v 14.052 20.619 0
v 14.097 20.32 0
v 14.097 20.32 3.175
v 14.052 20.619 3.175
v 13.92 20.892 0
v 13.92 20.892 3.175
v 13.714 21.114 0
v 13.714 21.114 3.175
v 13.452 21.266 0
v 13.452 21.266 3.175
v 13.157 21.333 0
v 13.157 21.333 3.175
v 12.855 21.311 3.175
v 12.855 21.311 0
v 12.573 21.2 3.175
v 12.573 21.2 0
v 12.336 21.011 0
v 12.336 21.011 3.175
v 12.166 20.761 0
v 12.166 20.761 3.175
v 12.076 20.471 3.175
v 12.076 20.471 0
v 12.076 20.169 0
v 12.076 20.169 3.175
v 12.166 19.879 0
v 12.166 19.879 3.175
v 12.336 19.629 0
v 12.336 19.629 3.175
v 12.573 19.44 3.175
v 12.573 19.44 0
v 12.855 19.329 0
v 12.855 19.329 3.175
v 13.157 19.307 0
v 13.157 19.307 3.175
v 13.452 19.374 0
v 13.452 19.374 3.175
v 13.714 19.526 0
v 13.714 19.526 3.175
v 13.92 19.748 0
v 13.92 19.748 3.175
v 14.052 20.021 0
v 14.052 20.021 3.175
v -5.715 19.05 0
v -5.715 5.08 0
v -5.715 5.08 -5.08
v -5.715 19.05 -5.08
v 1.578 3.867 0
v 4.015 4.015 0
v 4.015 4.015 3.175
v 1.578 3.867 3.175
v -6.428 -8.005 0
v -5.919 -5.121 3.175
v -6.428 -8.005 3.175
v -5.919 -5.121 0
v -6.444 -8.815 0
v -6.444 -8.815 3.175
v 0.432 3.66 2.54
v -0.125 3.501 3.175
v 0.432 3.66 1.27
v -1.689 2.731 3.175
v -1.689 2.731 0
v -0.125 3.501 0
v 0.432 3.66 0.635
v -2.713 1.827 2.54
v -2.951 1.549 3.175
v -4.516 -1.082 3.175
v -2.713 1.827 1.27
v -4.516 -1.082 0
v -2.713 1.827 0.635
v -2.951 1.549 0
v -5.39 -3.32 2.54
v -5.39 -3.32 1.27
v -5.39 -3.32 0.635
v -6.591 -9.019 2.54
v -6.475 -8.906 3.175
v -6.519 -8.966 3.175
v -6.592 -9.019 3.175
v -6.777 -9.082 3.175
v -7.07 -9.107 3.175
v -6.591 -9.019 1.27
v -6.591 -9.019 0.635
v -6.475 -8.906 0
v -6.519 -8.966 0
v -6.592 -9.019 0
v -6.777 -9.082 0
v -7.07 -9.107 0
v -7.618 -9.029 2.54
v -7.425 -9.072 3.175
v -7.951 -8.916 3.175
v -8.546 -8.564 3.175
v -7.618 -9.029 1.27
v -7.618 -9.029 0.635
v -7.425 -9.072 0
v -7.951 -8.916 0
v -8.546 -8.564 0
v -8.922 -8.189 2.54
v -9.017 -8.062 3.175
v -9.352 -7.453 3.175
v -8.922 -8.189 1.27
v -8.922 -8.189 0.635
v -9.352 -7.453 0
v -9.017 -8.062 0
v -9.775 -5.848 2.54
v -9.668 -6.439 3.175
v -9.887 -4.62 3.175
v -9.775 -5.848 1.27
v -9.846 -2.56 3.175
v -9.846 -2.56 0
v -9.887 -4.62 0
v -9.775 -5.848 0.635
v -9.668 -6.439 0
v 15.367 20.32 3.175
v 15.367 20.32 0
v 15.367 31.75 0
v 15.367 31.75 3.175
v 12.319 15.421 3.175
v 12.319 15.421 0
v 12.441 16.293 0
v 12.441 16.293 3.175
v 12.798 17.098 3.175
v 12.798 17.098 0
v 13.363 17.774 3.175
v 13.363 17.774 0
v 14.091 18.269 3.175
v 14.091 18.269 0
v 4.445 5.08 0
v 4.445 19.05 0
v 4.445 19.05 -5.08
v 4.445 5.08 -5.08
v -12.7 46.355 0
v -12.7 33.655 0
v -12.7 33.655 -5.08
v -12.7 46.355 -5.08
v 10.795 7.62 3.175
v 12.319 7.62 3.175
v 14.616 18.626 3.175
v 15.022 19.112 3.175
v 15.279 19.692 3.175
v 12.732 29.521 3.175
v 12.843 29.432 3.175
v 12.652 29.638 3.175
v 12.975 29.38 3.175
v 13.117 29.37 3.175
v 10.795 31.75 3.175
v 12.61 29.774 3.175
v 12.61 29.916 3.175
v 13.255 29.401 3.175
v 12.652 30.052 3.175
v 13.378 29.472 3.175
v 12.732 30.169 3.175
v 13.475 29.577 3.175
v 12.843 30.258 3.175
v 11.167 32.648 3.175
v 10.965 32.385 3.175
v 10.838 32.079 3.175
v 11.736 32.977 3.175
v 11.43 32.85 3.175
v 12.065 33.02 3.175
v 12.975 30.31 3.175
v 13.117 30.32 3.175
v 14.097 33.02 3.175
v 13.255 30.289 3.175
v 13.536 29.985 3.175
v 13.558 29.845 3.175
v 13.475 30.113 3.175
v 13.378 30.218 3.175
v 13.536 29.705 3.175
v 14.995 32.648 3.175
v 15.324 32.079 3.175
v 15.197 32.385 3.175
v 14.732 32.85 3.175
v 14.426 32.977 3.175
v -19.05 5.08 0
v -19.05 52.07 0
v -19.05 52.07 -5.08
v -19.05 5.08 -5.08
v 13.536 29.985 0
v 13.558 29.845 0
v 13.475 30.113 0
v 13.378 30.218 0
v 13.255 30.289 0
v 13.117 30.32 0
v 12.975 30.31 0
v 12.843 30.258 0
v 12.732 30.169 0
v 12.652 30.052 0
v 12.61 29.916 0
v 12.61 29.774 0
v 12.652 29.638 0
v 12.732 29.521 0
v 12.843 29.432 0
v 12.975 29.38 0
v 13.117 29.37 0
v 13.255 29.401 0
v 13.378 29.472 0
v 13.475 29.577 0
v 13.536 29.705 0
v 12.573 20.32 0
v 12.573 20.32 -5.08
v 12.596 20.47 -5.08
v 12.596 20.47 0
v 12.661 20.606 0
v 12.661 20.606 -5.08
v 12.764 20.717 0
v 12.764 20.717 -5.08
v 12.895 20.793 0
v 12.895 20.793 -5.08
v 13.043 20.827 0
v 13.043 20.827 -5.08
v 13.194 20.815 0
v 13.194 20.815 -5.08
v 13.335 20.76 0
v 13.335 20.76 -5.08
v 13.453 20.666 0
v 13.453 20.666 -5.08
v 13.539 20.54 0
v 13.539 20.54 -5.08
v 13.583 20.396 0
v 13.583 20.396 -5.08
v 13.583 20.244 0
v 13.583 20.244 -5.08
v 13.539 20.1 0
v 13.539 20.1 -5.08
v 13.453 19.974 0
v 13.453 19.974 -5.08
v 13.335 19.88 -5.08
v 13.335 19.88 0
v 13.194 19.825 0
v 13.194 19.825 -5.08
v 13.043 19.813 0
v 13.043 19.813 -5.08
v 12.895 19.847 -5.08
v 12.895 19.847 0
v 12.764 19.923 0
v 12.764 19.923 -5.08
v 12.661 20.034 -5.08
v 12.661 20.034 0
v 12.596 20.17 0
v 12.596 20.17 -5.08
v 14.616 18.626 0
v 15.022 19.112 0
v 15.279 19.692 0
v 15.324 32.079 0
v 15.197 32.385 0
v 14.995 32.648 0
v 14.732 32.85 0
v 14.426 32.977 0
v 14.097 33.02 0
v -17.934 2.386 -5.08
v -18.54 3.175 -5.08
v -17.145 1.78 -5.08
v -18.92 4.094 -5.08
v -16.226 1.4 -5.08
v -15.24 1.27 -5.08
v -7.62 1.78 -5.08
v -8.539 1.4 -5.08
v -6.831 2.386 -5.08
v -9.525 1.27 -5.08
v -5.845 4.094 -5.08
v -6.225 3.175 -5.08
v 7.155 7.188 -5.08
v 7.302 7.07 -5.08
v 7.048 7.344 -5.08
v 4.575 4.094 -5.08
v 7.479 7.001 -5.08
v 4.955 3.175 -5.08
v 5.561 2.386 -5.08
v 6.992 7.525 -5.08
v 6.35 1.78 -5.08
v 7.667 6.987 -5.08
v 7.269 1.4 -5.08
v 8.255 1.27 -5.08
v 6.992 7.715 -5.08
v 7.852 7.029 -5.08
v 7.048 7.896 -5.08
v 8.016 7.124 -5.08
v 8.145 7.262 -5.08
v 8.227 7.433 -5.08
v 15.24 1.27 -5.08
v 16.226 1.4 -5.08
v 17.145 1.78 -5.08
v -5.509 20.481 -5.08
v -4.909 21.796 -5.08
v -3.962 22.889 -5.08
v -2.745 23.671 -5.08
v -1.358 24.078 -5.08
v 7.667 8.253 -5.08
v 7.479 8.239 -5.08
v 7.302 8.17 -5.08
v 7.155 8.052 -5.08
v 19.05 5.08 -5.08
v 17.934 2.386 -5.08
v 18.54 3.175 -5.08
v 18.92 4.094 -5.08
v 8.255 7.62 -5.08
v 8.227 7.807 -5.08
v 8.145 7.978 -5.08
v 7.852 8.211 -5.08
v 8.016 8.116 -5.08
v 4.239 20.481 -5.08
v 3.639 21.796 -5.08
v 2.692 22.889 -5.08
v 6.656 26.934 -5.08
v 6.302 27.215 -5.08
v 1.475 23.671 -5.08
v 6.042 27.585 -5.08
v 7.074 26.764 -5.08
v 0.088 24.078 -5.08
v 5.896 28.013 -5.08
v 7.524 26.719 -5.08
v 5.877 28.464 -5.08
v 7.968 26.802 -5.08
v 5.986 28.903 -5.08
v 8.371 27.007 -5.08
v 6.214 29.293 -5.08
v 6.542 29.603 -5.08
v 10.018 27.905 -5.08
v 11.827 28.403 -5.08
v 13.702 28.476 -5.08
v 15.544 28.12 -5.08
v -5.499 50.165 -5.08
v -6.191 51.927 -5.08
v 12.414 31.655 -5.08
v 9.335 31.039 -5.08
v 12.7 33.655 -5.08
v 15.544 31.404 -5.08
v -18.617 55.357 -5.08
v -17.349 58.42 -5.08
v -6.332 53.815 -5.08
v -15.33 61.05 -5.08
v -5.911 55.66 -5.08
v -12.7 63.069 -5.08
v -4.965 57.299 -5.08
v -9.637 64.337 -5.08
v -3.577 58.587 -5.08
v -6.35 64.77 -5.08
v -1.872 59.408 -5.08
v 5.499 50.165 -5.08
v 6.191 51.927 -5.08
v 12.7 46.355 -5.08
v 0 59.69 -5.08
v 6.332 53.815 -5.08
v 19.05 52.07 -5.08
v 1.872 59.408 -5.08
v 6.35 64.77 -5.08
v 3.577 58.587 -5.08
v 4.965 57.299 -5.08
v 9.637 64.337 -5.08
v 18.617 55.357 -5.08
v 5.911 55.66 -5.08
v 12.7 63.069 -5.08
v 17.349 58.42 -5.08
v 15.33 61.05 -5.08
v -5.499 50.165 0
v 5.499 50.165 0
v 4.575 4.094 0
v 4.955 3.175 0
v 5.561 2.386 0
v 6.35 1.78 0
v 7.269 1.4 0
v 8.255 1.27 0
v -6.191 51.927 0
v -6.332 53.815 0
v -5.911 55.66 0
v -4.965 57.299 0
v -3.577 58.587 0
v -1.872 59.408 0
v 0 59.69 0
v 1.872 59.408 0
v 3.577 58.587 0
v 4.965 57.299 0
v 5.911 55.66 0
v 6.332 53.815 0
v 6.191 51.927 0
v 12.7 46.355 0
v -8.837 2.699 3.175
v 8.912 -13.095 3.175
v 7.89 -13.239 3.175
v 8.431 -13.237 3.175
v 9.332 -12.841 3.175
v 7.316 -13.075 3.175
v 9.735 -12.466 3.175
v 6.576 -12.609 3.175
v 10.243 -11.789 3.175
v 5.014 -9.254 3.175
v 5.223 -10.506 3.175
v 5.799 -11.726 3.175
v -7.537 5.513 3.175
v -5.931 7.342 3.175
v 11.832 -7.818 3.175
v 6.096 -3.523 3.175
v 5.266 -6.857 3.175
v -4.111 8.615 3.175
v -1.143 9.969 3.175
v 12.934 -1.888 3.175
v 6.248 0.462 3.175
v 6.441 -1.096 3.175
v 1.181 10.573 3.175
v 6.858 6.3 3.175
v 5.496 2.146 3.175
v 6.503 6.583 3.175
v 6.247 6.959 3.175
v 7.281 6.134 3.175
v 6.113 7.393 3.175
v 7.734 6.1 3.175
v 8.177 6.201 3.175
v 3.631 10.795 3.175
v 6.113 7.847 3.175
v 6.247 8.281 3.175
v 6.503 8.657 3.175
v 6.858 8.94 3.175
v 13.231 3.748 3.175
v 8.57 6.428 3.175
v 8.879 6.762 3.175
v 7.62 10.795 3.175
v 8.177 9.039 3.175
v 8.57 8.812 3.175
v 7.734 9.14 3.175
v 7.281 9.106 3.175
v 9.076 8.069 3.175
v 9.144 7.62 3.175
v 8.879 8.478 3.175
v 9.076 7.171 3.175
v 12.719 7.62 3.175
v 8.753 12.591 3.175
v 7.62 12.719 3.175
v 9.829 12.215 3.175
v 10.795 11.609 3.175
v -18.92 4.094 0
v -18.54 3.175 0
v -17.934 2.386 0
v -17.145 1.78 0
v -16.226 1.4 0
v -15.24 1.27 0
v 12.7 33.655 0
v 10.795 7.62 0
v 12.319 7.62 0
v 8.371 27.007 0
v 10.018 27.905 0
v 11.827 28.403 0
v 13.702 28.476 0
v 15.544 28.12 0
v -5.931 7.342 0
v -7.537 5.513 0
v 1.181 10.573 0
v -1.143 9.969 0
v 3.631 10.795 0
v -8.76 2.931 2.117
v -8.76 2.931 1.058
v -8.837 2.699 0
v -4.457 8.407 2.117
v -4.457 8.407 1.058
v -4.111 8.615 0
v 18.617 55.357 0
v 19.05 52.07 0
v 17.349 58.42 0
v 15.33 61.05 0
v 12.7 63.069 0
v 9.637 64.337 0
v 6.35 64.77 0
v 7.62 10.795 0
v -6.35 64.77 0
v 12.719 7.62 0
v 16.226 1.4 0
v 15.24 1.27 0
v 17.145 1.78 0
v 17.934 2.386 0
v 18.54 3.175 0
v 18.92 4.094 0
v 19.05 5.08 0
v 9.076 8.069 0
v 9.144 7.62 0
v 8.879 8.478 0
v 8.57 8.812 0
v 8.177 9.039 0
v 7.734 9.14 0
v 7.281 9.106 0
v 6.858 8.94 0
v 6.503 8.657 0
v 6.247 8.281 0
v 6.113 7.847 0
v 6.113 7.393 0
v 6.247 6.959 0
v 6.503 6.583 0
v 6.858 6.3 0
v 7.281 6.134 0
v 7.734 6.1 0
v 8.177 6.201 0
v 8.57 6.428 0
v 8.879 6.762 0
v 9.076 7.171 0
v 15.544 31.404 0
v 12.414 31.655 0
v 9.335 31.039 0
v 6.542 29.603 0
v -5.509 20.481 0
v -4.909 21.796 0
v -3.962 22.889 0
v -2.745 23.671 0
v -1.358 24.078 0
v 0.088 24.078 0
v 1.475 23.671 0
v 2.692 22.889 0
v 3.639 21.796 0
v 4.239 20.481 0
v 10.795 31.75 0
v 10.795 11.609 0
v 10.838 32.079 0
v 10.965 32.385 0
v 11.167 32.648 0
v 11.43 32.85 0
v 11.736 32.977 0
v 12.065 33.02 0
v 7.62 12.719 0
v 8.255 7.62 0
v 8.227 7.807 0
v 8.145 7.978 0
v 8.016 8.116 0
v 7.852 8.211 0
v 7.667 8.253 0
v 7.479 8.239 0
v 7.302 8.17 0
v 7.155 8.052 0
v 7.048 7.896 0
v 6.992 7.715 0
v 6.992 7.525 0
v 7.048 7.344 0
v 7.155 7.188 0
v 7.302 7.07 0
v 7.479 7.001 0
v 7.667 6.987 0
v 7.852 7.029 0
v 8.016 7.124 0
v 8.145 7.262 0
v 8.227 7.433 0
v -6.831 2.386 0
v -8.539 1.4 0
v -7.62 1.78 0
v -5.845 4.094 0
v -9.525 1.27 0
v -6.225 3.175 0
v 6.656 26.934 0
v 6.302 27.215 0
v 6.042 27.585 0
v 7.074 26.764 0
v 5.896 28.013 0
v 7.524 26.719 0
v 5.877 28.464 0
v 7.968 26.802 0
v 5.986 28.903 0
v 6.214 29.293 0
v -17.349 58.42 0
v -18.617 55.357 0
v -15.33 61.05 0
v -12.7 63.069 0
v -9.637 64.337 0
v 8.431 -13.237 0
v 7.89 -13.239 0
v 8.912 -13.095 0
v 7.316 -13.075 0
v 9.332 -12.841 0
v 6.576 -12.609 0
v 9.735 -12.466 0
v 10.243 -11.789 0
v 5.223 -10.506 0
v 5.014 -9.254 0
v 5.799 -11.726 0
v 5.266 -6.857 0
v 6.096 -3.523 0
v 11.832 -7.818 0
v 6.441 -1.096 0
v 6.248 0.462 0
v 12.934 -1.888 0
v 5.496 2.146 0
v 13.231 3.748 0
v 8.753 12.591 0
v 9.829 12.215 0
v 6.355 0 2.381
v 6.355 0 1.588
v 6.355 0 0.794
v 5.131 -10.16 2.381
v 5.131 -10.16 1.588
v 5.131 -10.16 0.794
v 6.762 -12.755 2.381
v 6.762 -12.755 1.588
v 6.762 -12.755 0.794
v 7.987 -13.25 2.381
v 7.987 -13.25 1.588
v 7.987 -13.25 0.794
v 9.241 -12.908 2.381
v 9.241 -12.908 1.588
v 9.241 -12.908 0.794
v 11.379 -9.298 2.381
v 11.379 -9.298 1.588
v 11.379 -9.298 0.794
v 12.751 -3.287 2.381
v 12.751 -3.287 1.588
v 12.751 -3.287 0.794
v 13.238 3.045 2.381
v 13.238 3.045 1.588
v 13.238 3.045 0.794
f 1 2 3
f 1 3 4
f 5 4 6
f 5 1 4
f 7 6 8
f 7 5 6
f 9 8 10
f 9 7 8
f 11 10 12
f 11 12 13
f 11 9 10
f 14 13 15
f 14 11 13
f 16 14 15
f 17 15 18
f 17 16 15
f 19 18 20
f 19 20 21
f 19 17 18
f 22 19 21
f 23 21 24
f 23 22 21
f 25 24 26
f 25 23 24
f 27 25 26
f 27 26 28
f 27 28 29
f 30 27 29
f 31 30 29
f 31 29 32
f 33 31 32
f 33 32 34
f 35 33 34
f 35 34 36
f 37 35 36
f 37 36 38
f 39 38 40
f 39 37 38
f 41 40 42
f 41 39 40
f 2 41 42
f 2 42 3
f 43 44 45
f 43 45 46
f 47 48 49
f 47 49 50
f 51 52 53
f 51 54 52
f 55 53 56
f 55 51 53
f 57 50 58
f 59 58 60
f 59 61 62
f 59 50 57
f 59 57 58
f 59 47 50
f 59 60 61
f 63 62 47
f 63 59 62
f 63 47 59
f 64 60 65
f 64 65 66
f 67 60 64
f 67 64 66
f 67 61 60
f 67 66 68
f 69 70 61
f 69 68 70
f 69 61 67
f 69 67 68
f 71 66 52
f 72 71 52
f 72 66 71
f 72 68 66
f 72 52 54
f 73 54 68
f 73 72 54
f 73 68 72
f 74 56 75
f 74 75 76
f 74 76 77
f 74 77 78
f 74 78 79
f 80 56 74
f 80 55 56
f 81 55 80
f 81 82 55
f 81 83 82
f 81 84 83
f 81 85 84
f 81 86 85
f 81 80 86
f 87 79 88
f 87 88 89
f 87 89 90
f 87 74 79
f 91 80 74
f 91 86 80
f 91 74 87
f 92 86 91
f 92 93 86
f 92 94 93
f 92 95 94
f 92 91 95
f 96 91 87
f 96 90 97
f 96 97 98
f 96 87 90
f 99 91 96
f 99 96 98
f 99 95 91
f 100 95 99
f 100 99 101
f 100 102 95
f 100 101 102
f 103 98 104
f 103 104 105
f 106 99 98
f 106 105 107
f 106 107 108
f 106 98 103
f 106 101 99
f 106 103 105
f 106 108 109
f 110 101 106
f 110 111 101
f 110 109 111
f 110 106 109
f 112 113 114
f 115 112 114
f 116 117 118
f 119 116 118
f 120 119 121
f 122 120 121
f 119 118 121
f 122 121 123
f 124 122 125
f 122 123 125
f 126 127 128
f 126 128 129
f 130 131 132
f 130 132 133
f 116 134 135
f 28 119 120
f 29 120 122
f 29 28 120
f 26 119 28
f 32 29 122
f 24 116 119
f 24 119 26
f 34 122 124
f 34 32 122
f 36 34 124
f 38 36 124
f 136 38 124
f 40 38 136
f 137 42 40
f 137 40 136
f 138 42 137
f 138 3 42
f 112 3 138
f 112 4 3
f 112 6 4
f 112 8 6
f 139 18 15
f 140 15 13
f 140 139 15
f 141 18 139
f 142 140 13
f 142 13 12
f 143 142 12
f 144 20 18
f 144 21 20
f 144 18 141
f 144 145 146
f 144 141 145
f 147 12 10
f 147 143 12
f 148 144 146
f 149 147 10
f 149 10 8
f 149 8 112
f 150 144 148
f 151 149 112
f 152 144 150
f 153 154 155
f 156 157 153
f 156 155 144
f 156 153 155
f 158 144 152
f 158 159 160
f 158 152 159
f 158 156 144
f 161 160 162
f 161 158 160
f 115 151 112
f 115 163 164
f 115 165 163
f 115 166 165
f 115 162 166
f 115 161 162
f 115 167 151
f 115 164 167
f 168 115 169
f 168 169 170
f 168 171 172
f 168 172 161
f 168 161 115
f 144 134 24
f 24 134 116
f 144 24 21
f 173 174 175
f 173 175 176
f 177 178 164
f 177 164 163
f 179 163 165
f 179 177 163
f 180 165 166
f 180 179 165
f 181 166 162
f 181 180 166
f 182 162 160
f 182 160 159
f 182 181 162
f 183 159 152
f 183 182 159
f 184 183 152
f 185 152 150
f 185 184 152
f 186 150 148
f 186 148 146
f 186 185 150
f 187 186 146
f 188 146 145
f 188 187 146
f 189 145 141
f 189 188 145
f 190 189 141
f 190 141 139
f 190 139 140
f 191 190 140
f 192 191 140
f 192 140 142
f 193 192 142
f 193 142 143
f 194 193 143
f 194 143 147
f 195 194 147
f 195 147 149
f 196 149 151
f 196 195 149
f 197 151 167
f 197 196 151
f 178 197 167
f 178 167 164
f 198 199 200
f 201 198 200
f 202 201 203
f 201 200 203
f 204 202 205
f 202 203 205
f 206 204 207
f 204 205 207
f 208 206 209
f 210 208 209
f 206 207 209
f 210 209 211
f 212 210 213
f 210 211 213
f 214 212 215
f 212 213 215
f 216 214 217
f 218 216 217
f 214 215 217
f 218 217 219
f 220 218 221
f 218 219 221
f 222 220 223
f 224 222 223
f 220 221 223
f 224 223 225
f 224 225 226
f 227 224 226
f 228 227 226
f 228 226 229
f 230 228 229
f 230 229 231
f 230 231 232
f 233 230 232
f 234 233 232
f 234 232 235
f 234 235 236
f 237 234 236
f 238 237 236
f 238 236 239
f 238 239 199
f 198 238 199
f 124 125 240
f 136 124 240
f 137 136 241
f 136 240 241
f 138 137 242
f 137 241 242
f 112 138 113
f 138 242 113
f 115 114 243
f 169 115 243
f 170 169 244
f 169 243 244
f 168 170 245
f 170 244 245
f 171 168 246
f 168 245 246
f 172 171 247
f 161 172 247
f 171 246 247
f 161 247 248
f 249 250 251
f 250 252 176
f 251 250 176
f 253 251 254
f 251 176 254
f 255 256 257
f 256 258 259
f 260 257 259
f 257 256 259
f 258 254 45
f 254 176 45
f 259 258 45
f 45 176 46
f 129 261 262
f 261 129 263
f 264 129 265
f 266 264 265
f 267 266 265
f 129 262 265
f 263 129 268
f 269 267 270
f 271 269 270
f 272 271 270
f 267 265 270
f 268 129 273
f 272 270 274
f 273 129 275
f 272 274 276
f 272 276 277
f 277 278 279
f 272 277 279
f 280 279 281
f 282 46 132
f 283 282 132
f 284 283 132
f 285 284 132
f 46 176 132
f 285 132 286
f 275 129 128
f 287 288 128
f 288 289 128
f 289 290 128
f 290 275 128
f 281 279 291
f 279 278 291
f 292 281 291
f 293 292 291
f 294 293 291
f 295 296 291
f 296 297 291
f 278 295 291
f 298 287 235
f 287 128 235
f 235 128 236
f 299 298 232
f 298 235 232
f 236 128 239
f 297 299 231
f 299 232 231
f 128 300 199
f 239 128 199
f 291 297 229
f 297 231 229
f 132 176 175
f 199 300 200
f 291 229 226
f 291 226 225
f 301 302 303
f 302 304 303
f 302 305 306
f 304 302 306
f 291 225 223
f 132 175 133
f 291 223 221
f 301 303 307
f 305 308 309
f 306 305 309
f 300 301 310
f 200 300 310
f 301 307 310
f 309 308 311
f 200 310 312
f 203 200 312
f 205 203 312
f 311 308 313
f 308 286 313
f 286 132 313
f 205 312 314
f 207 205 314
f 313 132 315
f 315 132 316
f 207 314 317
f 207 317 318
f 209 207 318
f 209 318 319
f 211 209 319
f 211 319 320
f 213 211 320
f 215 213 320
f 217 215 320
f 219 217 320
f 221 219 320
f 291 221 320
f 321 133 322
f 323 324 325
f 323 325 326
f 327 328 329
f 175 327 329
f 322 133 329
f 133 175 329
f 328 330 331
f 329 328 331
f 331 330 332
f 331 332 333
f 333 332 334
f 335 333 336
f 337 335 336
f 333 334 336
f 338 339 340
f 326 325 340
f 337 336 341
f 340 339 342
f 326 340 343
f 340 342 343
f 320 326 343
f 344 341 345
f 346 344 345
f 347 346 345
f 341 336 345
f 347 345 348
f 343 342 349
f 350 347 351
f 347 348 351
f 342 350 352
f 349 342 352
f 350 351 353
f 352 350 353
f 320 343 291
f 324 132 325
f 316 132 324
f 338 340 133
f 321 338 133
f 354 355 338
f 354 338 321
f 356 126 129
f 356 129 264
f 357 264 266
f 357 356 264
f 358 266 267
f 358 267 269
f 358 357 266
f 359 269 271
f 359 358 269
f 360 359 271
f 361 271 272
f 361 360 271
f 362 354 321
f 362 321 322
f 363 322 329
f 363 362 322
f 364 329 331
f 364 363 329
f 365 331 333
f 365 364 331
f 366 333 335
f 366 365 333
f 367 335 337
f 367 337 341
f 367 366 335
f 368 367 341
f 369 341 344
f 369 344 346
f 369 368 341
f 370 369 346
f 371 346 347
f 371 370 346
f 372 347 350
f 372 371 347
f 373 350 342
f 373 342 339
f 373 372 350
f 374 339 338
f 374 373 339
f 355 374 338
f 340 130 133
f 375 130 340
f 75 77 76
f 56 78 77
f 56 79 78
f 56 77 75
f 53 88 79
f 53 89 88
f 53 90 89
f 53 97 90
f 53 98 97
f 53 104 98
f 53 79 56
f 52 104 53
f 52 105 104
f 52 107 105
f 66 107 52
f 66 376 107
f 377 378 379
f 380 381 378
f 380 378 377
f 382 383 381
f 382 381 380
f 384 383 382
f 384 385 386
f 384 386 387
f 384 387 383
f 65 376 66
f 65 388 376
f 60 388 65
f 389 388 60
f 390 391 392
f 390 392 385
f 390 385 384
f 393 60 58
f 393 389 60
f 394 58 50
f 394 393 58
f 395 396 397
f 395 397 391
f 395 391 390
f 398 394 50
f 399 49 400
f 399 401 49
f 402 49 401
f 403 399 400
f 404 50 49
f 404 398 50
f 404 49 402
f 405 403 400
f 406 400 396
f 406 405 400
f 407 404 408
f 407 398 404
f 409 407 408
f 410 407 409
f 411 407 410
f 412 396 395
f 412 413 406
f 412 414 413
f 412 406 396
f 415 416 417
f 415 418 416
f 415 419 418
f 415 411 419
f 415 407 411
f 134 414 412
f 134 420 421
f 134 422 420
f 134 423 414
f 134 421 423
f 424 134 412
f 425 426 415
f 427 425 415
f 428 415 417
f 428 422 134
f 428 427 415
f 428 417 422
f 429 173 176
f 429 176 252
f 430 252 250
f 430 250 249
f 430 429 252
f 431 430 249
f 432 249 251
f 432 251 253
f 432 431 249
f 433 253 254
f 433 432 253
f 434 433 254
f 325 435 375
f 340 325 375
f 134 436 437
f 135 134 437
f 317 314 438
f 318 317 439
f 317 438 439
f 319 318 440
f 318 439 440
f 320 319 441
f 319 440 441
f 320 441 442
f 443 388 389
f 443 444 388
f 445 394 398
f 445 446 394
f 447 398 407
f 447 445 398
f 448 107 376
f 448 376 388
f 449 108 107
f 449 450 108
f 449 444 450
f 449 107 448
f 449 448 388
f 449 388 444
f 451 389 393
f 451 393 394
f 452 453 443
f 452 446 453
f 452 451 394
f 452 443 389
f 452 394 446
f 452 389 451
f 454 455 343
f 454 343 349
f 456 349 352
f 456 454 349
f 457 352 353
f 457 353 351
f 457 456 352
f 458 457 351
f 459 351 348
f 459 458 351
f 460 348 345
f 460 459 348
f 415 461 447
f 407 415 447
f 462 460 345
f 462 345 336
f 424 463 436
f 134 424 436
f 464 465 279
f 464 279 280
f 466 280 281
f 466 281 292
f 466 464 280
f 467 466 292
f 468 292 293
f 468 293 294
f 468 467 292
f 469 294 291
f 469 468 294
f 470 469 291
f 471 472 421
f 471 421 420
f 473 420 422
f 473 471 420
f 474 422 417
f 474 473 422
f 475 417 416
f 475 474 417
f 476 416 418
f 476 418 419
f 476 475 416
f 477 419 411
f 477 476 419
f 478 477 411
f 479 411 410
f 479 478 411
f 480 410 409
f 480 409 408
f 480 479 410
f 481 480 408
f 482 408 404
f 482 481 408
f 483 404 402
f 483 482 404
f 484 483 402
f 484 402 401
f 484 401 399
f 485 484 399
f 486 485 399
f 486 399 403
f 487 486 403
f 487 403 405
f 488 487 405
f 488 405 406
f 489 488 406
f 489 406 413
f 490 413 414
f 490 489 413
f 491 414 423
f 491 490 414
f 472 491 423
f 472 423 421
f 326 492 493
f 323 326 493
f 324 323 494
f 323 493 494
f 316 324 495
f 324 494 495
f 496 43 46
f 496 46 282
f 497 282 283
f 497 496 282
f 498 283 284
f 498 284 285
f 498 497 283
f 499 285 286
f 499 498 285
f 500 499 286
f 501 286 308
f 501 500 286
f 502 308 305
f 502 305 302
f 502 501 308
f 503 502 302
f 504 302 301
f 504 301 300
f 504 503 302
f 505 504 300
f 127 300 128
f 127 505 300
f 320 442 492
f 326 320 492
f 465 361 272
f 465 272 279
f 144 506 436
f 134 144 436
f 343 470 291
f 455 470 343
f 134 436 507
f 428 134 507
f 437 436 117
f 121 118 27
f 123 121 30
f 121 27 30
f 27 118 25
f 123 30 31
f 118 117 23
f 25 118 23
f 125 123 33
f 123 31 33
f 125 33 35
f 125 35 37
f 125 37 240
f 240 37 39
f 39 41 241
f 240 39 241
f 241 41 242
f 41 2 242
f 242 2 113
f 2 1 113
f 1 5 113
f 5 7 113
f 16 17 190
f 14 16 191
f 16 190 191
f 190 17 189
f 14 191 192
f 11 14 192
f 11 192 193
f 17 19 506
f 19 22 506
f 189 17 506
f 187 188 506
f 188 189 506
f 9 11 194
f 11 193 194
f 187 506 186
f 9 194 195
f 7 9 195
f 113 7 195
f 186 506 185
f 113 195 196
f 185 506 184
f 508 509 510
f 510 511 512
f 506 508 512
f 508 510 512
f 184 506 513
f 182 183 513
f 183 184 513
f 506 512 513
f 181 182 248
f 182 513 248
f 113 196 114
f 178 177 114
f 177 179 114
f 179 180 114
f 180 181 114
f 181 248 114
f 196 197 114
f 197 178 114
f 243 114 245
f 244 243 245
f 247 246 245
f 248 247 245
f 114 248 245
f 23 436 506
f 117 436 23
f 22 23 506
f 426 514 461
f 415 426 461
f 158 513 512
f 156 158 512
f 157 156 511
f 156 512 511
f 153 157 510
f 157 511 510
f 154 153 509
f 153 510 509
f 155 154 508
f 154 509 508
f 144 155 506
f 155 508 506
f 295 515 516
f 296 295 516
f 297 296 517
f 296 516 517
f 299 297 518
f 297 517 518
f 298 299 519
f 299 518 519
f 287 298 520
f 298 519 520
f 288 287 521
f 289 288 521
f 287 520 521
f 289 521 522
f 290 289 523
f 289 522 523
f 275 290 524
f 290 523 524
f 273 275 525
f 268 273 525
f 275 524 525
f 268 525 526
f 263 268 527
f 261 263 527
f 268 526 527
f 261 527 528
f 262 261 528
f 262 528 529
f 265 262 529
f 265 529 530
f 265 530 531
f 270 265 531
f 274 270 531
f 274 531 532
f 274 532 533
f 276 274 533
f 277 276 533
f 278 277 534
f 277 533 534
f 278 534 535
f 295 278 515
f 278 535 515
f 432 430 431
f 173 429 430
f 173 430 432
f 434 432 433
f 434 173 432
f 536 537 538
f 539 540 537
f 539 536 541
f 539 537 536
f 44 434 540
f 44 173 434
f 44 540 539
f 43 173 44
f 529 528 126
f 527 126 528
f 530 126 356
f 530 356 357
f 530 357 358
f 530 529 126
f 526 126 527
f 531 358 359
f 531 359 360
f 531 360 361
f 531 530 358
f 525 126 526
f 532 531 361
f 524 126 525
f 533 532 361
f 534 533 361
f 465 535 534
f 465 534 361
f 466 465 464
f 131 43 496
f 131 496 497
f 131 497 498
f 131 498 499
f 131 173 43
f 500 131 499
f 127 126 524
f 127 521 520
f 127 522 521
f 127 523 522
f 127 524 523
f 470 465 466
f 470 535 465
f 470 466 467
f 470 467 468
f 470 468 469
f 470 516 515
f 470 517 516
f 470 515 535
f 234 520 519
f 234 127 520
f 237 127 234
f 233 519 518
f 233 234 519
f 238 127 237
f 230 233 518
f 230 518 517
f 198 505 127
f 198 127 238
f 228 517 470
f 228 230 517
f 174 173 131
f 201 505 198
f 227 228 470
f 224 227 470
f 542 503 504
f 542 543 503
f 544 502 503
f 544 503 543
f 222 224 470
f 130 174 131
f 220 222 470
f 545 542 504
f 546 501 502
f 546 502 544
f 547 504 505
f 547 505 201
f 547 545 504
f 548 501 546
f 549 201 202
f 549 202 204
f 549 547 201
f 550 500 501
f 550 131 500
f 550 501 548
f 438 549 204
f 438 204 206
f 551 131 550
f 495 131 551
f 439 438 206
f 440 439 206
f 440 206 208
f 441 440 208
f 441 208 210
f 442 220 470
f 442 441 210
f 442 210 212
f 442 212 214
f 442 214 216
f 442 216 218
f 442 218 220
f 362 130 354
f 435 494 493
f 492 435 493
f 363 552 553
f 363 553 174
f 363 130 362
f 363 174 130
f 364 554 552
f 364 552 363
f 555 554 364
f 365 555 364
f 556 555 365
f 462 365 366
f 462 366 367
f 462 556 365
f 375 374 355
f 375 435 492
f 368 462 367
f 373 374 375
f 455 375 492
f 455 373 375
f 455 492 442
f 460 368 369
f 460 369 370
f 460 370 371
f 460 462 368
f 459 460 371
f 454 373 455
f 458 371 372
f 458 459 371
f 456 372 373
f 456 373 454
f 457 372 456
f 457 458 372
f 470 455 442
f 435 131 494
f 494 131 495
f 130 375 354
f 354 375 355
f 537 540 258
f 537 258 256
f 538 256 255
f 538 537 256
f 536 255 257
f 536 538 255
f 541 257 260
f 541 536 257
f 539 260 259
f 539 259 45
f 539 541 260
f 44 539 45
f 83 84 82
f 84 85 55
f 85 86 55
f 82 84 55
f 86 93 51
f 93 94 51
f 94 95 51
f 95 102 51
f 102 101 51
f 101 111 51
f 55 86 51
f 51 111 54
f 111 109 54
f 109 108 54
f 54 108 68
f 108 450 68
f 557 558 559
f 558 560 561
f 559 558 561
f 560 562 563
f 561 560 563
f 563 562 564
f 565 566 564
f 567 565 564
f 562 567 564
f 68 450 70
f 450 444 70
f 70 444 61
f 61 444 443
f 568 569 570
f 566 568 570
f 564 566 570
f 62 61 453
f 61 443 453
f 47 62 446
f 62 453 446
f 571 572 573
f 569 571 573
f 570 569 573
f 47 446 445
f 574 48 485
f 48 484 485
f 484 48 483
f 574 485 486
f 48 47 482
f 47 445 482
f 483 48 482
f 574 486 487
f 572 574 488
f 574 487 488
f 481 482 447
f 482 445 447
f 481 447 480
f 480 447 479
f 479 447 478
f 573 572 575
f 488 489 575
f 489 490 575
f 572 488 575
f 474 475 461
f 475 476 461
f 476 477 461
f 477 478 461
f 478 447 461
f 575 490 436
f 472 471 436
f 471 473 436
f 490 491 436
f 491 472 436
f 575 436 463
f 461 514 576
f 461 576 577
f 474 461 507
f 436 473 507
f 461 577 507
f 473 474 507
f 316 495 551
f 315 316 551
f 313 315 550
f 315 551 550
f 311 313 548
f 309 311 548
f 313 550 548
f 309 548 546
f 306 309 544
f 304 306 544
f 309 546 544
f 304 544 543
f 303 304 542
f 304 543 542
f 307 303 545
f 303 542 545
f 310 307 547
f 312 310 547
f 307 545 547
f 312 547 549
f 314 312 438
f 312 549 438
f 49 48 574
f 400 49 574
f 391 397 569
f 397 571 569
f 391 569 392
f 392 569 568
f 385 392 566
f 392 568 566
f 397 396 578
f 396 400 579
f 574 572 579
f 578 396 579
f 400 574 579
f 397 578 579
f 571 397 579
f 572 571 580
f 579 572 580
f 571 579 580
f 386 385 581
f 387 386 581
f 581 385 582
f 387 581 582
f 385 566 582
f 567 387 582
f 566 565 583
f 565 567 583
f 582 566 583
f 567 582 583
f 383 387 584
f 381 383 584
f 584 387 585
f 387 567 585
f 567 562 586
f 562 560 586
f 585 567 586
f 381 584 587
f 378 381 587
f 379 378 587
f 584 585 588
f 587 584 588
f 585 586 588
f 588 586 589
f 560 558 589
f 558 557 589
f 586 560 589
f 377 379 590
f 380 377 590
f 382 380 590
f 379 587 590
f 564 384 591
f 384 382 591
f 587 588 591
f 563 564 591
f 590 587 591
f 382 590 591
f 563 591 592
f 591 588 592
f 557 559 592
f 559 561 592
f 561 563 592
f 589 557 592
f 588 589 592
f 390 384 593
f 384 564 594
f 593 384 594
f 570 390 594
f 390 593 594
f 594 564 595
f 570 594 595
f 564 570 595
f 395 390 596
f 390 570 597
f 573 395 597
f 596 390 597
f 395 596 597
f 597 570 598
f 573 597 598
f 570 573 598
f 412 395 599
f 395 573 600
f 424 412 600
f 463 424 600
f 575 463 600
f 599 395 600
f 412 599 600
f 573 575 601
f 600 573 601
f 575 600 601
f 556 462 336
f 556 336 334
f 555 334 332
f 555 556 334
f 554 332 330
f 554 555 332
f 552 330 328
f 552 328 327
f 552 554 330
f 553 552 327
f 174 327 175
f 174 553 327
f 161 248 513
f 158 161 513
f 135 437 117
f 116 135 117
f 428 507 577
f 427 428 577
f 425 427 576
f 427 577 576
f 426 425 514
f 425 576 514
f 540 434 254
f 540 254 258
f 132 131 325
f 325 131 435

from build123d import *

# Parameters (mm, degrees)
F0_R      = 1.524
F1_DEPTH  = 3.175
F2_R      = 0.635
F3_DEPTH  = 5.08
F4_R      = 1.016
F4_R_2    = 0.4765946888
F5_DEPTH  = 3.175
F6_D      = 1.016
F8_DEPTH  = 25.4
F9_W      = 25.4
F9_H      = 12.7
F10_DEPTH = 25.4


with BuildPart() as f1:
    # F0 (on Top) → F1 (new body)
    with BuildSketch(Plane.XY):
        with BuildLine():
            add(Edge.make_bspline(
                [(4.0146798487, 4.0146798487), (4.1965253446, 3.8388911287), (8.6034145204, -0.4632855785), (2.7081005667, -9.8256704348), (11.7725199973, -17.5553609081), (14.1365779009, 3.6148799922), (12.7186926547, 7.62)],
                knots=[0.342546698, 0.342546698, 0.342546698, 0.342546698, 0.4592804701, 0.6325061967, 0.7529179928, 1, 1, 1, 1], degree=3))
            Line((12.7186926547, 7.62), (10.795, 7.62))
            Line((10.795, 7.62), (10.795, 11.6094914196))
            ThreePointArc((10.795, 11.6094914196), (9.3015879683, 12.4334113363), (7.62, 12.7186926547))
            Line((7.62, 12.7186926547), (7.62, 10.795))
            Line((7.62, 10.795), (3.6305085804, 10.795))
            add(Edge.make_bspline(
                [(-9.8462747246, -2.5595309993), (-9.7056248656, -0.6525965961), (-8.5851336869, 4.887523046), (-4.9223199156, 8.8010582074), (0.6214204647, 10.795), (3.6305085804, 10.795)],
                knots=[0.5944478908, 0.5944478908, 0.5944478908, 0.5944478908, 0.6806042793, 0.8326685389, 1, 1, 1, 1], degree=3))
            add(Edge.make_bspline(
                [(-9.8462747246, -2.5595309993), (-8.3692950914, 1.0159390836), (-1.2709087492, 7.2679963496), (3.9839462531, 4.0422517138), (3.9949946041, 4.0337094316), (4.0146798487, 4.0146798487)],
                knots=[0.0522687231, 0.0522687231, 0.0522687231, 0.0522687231, 0.2064144516, 0.3299099657, 0.342546698, 0.342546698, 0.342546698, 0.342546698], degree=3))
        make_face()
        with Locations((7.62, 7.62)):
            Circle(F0_R, mode=Mode.SUBTRACT)
        with BuildLine():
            add(Edge.make_bspline(
                [(4.0146798487, 4.0146798487), (1.5786877312, 3.9404286991), (-3.8406877482, 3.7898553775), (-6.77720019, -7.7849709454), (-6.196463978, -9.2958597248), (-9.5973471823, -8.9863377062), (-10.0193170502, -4.9056432962), (-9.8462747246, -2.5595309993)],
                knots=[0, 0, 0, 0, 0.1532538956, 0.3403377332, 0.3978065221, 0.4884491935, 0.5944478908, 0.5944478908, 0.5944478908, 0.5944478908], degree=3))
            add(Edge.make_bspline(
                [(-9.8462747246, -2.5595309993), (-8.3692950914, 1.0159390836), (-1.2709087492, 7.2679963496), (3.9839462531, 4.0422517138), (3.9949946041, 4.0337094316), (4.0146798487, 4.0146798487)],
                knots=[0.0522687231, 0.0522687231, 0.0522687231, 0.0522687231, 0.2064144516, 0.3299099657, 0.342546698, 0.342546698, 0.342546698, 0.342546698], degree=3))
        make_face()
    extrude(amount=F1_DEPTH)


with BuildPart() as f3:
    # F2 (on Top) → F3 (new body)
    with BuildSketch(Plane.XY):
        with BuildLine():
            Line((6.35, 64.77), (-6.35, 64.77))
            ThreePointArc((-6.35, 64.77), (-15.3302561211, 61.0502561211), (-19.05, 52.07))
            Line((-19.05, 52.07), (-19.05, 5.08))
            ThreePointArc((-19.05, 5.08), (-17.9340768363, 2.3859231637), (-15.24, 1.27))
            Line((-15.24, 1.27), (-9.525, 1.27))
            ThreePointArc((-9.525, 1.27), (-6.8309231637, 2.3859231637), (-5.715, 5.08))
            Line((-5.715, 5.08), (-5.715, 19.05))
            ThreePointArc((-5.715, 19.05), (-0.635, 24.13), (4.445, 19.05))
            Line((4.445, 19.05), (4.445, 5.08))
            ThreePointArc((4.445, 5.08), (5.5609231637, 2.3859231637), (8.255, 1.27))
            Line((8.255, 1.27), (15.24, 1.27))
            ThreePointArc((15.24, 1.27), (17.9340768363, 2.3859231637), (19.05, 5.08))
            Line((19.05, 5.08), (19.05, 52.07))
            ThreePointArc((19.05, 52.07), (15.3302561211, 61.0502561211), (6.35, 64.77))
        make_face()
        with Locations((7.62, 7.62)):
            Circle(F2_R, mode=Mode.SUBTRACT)
        with BuildLine():
            ThreePointArc((-5.499261314, 50.165), (0, 59.69), (5.499261314, 50.165))
            Line((5.499261314, 50.165), (-5.499261314, 50.165))
        make_face(mode=Mode.SUBTRACT)
    extrude(amount=-F3_DEPTH)

    # F6 (through all)
    with Locations(Plane.XY):
        with Locations((13.081, 20.32)):
            Hole(F6_D / 2)

    # F7 (on face) → F8 (cut)
    with BuildSketch(Plane.XY):
        with BuildLine():
            Line((15.5435356842, 28.1201432546), (15.5435356842, 31.4043808392))
            ThreePointArc((15.5435356842, 31.4043808392), (10.8526970709, 31.4538334208), (6.542203401, 29.6028723799))
            ThreePointArc((6.542203401, 29.6028723799), (6.1585518853, 27.3908316899), (8.3705925754, 27.0071801742))
            ThreePointArc((8.3705925754, 27.0071801742), (11.826845486, 28.4029087118), (15.5435356842, 28.1201432546))
        make_face()
    extrude(amount=-F8_DEPTH, mode=Mode.SUBTRACT)

    # F9 (on face) → F10 (cut)
    with BuildSketch(Plane.XY):
        with Locations((0, 40.005)):
            Rectangle(F9_W, F9_H)
    extrude(amount=-F10_DEPTH, mode=Mode.SUBTRACT)


with BuildPart() as f5:
    # F4 (on face) → F5 (new body)
    with BuildSketch(Plane.XY):
        with BuildLine():
            Line((10.795, 31.75), (10.795, 7.62))
            Line((10.795, 7.62), (12.319, 7.62))
            Line((12.319, 7.62), (12.319, 15.4210254134))
            ThreePointArc((12.319, 15.4210254134), (12.7981833657, 17.09828439), (14.0910930233, 18.2692664521))
            ThreePointArc((14.0910930233, 18.2692664521), (15.0219879767, 19.1123735369), (15.367, 20.32))
            Line((15.367, 20.32), (15.367, 31.75))
            ThreePointArc((15.367, 31.75), (14.9950256121, 32.6480256121), (14.097, 33.02))
            Line((14.097, 33.02), (12.065, 33.02))
            ThreePointArc((12.065, 33.02), (11.1669743879, 32.6480256121), (10.795, 31.75))
        make_face()
        with Locations((13.081, 20.32)):
            Circle(F4_R, mode=Mode.SUBTRACT)
        with Locations((13.081, 29.845)):
            Circle(F4_R_2, mode=Mode.SUBTRACT)
    extrude(amount=F5_DEPTH)


solid = Compound([f1.part, f3.part, f5.part])
